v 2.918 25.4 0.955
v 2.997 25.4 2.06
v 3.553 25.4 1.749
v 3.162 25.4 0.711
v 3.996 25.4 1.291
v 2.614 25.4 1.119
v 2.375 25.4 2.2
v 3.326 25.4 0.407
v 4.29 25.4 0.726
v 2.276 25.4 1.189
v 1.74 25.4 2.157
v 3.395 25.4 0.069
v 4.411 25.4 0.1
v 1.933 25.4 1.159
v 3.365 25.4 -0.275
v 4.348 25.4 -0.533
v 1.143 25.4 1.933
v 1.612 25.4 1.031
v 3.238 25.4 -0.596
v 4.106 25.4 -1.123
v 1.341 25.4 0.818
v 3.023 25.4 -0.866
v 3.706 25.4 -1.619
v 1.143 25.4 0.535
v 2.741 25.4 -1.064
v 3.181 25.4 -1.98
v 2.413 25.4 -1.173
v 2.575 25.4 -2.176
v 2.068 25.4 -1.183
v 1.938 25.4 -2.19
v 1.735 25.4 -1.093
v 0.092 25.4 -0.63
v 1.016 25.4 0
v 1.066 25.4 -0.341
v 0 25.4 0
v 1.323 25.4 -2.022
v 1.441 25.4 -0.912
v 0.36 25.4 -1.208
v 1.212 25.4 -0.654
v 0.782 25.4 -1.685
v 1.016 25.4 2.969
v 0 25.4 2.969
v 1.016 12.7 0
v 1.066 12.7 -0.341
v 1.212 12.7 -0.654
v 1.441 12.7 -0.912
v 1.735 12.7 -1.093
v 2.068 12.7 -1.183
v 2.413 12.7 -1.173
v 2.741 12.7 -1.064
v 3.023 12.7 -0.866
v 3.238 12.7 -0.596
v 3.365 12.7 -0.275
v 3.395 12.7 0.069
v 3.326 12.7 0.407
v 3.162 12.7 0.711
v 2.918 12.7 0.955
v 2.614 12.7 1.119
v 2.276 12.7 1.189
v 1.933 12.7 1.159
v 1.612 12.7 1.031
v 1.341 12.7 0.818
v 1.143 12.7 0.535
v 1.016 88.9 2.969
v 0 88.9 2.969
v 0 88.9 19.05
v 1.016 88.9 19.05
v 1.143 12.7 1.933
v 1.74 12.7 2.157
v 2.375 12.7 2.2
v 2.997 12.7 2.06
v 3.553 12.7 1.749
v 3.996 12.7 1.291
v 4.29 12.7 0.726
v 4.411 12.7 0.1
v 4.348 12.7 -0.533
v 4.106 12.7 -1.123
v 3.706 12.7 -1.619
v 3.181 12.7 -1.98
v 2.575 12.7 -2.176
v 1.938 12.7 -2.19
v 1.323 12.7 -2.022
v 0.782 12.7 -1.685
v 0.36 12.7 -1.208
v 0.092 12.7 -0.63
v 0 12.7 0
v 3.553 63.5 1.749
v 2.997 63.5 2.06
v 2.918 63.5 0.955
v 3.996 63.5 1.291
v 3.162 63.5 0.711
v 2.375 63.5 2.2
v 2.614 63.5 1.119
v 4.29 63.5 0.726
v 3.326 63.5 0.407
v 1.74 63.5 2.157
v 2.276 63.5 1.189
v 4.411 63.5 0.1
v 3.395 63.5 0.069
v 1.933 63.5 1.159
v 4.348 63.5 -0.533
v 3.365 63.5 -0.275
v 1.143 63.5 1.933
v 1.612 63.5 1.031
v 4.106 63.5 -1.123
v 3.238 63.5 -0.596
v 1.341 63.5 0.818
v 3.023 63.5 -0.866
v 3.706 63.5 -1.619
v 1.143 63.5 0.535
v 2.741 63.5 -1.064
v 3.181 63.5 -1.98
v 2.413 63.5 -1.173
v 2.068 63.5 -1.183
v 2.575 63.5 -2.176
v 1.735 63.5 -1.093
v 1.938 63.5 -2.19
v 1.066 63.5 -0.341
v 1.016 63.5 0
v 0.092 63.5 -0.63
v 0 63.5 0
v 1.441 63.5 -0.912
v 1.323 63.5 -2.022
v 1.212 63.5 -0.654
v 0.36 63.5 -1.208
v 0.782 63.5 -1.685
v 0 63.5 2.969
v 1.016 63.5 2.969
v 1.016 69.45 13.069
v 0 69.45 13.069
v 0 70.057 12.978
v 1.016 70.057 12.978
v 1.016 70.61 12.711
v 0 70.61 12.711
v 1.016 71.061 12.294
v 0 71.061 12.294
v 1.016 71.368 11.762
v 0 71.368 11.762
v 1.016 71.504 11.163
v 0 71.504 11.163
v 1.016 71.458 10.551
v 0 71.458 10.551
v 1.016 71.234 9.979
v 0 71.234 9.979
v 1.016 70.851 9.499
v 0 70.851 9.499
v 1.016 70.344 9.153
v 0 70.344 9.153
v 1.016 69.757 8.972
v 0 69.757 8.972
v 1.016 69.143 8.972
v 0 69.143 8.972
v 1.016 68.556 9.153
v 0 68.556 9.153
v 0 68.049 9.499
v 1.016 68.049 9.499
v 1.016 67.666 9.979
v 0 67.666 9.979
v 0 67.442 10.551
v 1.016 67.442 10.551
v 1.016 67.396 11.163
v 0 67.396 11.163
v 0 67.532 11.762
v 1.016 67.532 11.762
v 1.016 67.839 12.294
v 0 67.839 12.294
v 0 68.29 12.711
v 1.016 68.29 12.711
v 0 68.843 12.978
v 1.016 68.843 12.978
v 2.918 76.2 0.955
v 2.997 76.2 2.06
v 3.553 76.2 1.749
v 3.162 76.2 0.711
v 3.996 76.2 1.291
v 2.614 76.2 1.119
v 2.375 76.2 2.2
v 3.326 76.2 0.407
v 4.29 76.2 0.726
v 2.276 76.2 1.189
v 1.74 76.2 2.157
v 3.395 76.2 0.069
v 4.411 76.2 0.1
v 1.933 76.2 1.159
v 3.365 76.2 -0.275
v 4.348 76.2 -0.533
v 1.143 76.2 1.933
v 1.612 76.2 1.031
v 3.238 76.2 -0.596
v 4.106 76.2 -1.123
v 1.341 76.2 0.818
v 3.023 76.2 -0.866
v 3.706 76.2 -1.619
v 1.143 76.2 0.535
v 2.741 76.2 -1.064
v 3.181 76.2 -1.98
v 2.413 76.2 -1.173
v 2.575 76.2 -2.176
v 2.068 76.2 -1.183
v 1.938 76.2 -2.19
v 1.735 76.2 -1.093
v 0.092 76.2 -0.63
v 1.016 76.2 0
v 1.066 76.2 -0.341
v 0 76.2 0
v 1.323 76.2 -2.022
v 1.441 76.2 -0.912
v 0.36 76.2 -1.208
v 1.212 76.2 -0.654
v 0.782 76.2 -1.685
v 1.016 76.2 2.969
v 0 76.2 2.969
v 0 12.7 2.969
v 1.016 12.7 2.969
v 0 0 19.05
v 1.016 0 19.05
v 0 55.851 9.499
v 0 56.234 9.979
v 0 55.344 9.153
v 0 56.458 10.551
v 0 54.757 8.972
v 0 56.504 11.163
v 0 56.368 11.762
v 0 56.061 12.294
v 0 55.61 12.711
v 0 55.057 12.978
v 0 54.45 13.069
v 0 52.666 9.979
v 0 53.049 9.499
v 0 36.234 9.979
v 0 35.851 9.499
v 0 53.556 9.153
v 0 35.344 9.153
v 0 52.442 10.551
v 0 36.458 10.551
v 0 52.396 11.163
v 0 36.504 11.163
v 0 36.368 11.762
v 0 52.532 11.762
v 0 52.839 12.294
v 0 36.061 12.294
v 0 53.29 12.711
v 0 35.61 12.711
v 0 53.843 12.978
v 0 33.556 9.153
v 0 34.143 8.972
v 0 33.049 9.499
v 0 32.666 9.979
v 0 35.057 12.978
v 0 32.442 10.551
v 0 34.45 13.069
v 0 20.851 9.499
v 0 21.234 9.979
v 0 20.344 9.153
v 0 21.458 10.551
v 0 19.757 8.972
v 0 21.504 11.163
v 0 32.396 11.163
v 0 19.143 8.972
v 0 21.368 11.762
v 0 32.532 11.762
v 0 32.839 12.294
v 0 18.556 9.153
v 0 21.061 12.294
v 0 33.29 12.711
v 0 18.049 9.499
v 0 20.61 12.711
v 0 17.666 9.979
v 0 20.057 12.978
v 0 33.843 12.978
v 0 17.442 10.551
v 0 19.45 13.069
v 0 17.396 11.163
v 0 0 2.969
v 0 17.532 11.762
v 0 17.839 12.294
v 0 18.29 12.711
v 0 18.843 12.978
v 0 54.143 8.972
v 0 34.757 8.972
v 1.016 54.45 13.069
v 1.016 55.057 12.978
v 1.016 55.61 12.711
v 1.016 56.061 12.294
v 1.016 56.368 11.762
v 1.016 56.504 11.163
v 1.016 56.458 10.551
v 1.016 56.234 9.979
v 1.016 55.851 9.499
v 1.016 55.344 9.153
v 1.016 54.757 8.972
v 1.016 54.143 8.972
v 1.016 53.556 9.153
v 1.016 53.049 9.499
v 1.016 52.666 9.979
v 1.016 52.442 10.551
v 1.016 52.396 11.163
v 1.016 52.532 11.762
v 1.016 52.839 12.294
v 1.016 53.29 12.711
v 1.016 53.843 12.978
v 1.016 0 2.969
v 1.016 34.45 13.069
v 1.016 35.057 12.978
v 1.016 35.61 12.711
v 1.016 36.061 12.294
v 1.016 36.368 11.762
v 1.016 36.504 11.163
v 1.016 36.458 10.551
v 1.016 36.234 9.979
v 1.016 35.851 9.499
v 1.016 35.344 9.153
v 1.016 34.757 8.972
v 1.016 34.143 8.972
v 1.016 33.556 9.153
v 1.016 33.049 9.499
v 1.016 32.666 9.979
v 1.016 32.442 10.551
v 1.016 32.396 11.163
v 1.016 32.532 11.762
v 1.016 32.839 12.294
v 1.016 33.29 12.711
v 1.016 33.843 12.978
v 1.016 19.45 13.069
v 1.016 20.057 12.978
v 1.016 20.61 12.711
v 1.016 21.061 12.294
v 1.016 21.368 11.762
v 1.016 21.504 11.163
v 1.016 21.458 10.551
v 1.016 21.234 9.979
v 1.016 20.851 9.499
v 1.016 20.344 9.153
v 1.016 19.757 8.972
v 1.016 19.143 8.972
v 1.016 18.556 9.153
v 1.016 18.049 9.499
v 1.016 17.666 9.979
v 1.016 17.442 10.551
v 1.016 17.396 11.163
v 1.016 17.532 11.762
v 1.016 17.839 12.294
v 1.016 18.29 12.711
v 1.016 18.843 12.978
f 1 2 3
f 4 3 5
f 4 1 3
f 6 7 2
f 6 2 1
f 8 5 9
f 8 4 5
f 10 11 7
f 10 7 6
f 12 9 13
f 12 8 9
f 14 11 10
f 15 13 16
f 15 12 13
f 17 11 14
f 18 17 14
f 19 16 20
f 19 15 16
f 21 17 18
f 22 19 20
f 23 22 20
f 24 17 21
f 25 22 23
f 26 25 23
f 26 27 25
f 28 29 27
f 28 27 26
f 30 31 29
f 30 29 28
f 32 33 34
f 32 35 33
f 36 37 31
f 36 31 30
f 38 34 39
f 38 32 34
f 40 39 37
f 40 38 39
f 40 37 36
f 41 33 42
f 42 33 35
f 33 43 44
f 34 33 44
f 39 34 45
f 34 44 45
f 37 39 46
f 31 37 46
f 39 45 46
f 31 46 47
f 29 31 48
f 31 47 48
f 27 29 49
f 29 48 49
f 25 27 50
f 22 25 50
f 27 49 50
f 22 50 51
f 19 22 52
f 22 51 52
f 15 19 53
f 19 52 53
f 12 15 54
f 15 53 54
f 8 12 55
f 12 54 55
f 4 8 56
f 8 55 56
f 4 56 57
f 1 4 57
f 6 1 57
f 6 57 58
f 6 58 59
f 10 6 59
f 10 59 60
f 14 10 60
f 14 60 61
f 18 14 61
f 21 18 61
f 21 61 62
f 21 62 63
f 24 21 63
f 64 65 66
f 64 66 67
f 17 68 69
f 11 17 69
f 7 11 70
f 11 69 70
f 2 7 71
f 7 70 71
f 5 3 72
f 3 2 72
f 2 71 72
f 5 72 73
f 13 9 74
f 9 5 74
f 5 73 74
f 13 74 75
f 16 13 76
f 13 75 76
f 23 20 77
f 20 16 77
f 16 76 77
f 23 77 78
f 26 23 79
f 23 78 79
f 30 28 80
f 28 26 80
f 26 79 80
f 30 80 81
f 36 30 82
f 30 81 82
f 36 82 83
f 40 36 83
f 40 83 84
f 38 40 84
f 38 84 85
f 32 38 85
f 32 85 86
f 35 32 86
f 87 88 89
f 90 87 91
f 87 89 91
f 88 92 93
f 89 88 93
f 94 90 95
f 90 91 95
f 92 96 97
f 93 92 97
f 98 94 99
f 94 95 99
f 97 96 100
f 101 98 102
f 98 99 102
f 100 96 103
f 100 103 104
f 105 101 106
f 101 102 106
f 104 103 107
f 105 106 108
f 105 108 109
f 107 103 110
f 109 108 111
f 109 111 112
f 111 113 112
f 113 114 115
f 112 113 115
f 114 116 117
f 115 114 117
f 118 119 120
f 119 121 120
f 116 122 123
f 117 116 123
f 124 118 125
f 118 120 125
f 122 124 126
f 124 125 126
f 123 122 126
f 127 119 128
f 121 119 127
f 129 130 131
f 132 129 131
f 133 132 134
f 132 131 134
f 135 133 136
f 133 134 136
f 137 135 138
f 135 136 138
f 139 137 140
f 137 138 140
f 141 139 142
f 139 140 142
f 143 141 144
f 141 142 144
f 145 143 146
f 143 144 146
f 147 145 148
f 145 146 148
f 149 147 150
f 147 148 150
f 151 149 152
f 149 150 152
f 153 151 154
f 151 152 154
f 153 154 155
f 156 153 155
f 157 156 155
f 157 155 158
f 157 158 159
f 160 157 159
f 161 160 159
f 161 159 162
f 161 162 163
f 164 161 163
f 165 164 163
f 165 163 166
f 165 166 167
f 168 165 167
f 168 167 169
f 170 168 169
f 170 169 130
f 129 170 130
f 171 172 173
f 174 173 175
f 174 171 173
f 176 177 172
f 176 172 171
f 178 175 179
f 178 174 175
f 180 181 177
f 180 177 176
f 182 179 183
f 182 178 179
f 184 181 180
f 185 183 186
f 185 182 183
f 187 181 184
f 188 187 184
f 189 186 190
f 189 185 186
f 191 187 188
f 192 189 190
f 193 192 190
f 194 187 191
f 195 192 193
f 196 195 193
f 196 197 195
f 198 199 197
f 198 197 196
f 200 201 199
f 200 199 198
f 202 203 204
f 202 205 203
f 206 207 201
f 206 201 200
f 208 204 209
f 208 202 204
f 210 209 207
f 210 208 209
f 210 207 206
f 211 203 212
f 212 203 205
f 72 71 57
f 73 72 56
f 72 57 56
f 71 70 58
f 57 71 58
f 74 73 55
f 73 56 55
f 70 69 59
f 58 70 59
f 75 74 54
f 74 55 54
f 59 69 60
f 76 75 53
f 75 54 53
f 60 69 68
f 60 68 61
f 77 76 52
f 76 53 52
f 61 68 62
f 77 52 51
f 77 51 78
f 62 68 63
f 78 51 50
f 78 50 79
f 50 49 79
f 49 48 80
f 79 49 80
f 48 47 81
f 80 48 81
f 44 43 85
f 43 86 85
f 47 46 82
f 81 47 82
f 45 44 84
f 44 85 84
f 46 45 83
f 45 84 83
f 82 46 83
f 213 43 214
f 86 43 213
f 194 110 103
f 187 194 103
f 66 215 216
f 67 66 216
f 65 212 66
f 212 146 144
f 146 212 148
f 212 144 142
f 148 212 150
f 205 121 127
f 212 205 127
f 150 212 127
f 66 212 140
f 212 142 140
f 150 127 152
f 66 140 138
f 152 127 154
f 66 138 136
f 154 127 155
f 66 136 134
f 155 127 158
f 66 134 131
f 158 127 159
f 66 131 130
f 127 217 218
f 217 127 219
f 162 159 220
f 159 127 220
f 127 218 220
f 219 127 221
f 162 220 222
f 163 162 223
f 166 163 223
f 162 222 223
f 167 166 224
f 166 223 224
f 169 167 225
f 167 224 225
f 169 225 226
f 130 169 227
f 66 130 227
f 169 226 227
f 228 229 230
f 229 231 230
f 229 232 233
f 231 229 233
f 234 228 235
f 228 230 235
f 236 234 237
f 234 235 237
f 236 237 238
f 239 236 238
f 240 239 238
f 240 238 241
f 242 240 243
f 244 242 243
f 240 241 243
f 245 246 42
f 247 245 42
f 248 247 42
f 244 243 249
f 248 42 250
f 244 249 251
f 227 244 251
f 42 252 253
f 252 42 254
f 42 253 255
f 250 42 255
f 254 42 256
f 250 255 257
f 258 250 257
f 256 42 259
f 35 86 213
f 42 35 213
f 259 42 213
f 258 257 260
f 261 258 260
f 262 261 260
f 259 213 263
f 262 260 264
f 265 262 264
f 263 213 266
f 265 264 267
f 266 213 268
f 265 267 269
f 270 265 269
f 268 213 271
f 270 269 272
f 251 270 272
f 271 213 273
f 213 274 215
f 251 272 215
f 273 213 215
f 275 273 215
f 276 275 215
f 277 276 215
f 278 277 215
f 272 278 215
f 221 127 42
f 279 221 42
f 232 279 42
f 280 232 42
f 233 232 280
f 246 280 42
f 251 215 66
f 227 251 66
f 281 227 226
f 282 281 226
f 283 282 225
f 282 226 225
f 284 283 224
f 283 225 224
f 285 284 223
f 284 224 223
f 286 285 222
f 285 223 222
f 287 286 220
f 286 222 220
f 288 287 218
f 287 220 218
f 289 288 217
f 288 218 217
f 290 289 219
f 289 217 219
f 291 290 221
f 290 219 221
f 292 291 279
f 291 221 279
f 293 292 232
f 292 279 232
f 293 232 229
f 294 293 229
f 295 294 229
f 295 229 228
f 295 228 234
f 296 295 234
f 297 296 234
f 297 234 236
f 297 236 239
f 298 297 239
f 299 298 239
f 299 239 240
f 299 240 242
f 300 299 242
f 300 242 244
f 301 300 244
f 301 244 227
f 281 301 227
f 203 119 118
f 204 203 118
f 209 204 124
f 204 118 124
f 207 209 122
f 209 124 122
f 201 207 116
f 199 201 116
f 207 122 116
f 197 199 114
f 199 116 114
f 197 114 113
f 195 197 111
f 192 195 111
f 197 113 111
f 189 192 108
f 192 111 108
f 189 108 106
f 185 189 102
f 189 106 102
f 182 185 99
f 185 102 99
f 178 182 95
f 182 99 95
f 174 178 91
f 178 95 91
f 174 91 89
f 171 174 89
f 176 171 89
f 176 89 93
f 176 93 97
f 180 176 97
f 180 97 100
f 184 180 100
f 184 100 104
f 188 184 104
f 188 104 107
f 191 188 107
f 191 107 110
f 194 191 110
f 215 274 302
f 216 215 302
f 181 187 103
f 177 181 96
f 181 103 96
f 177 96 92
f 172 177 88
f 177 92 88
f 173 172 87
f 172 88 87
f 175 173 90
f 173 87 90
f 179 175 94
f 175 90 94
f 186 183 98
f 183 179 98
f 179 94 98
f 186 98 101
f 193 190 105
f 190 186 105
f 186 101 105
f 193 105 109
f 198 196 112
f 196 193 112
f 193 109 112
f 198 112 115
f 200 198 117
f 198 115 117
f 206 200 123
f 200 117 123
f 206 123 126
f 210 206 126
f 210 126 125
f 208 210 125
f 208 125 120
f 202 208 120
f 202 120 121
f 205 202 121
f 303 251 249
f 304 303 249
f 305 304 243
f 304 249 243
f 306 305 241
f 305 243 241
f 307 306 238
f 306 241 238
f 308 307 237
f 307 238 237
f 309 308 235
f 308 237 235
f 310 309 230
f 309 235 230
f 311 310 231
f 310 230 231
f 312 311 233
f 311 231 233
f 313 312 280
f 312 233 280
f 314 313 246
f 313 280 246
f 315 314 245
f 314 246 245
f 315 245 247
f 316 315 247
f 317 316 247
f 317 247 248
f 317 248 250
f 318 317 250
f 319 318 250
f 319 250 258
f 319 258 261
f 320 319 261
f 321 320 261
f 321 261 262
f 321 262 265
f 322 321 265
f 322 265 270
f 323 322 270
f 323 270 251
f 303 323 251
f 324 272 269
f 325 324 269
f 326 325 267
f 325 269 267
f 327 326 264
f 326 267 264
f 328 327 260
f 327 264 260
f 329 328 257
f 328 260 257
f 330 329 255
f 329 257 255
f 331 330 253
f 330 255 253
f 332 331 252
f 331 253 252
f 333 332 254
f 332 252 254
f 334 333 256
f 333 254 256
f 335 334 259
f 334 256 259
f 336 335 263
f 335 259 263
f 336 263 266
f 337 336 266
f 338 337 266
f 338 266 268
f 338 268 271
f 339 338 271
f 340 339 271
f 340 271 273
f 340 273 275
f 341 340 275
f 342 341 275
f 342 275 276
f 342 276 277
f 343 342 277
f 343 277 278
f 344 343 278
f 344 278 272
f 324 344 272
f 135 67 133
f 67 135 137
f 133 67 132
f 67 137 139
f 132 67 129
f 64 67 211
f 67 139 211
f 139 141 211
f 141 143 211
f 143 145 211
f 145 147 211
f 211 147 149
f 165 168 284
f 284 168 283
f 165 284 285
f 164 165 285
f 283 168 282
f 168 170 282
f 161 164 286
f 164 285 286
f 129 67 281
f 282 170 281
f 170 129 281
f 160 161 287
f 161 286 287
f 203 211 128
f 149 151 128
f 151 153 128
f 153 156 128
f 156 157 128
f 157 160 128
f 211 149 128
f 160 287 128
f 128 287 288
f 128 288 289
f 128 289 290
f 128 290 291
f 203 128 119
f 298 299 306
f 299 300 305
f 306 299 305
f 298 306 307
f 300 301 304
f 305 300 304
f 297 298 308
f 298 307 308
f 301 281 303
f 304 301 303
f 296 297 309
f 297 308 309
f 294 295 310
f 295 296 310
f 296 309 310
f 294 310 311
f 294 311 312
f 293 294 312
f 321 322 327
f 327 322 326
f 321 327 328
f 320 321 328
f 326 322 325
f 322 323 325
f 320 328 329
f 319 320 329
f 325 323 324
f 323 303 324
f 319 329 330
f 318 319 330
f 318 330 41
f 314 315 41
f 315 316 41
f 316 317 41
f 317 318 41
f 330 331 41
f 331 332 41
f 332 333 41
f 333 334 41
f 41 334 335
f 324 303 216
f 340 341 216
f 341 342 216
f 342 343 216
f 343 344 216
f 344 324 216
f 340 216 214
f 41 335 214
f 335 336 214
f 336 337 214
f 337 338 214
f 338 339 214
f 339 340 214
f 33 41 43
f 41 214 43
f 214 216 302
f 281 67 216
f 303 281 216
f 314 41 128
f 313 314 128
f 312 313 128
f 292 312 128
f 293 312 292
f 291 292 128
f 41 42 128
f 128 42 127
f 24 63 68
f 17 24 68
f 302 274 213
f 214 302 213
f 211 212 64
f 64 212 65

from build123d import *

# Parameters (mm, degrees)
BOSS_EXTRUDE2_DEPTH = 88.9
SKETCH8_W           = 5.93725
SKETCH8_H           = 12.7
CUT_EXTRUDE3_DEPTH  = 92.025212307
SKETCH10_W          = 5.93725
SKETCH10_H          = 12.7
CUT_EXTRUDE4_DEPTH  = 92.025212307
SKETCH16_R          = 2.06
CUT_EXTRUDE6_DEPTH  = 2.54


with BuildPart() as part:
    # Sketch4 → Boss-Extrude2 (new body)
    with BuildSketch(Plane(origin=(0, 0, 0), x_dir=(1, 0, 0), z_dir=(0, 1, 0))):
        with BuildLine():
            Line((0, 0), (0, -19.05))
            Line((0, -19.05), (1.016, -19.05))
            Line((1.016, -19.05), (1.016, 0))
            ThreePointArc((1.016, 0), (3.365064987, 0.274963066), (1.143, -0.535060511))
            Line((1.143, -0.535060511), (1.143, -1.933363843))
            ThreePointArc((1.143, -1.933363843), (4.106126962, 1.122980938), (0, 0))
        make_face()
    extrude(amount=BOSS_EXTRUDE2_DEPTH)

    # Sketch8 → Cut-Extrude3 (cut, through all)
    with BuildSketch(Plane(origin=(0, 0, 0), x_dir=(0, 0, -1), z_dir=(1, 0, 0))):
        with Locations((0, 6.35)):
            Rectangle(SKETCH8_W, SKETCH8_H)
        with Locations((0, 31.75)):
            Rectangle(SKETCH8_W, SKETCH8_H)
        with Locations((0, 57.15)):
            Rectangle(SKETCH8_W, SKETCH8_H)
        with Locations((0, 82.55)):
            Rectangle(SKETCH8_W, SKETCH8_H)
    extrude(amount=CUT_EXTRUDE3_DEPTH, mode=Mode.SUBTRACT)

    # Sketch10 → Cut-Extrude4 (cut, through all)
    with BuildSketch(Plane(origin=(0, 0, 0), x_dir=(0, 0, -1), z_dir=(1, 0, 0))):
        with Locations((0, 44.45)):
            Rectangle(SKETCH10_W, SKETCH10_H)
    extrude(amount=CUT_EXTRUDE4_DEPTH, mode=Mode.SUBTRACT)

    # Sketch16 → Cut-Extrude6 (cut)
    with BuildSketch(Plane.ZY):
        with Locations((11.0093125, 54.45)):
            Circle(SKETCH16_R)
        with Locations((11.0093125, 69.449999972)):
            Circle(SKETCH16_R)
        with Locations((11.0093125, 34.45)):
            Circle(SKETCH16_R)
        with Locations((11.0093125, 19.450000028)):
            Circle(SKETCH16_R)
    extrude(amount=-CUT_EXTRUDE6_DEPTH, mode=Mode.SUBTRACT)


solid = part.part
